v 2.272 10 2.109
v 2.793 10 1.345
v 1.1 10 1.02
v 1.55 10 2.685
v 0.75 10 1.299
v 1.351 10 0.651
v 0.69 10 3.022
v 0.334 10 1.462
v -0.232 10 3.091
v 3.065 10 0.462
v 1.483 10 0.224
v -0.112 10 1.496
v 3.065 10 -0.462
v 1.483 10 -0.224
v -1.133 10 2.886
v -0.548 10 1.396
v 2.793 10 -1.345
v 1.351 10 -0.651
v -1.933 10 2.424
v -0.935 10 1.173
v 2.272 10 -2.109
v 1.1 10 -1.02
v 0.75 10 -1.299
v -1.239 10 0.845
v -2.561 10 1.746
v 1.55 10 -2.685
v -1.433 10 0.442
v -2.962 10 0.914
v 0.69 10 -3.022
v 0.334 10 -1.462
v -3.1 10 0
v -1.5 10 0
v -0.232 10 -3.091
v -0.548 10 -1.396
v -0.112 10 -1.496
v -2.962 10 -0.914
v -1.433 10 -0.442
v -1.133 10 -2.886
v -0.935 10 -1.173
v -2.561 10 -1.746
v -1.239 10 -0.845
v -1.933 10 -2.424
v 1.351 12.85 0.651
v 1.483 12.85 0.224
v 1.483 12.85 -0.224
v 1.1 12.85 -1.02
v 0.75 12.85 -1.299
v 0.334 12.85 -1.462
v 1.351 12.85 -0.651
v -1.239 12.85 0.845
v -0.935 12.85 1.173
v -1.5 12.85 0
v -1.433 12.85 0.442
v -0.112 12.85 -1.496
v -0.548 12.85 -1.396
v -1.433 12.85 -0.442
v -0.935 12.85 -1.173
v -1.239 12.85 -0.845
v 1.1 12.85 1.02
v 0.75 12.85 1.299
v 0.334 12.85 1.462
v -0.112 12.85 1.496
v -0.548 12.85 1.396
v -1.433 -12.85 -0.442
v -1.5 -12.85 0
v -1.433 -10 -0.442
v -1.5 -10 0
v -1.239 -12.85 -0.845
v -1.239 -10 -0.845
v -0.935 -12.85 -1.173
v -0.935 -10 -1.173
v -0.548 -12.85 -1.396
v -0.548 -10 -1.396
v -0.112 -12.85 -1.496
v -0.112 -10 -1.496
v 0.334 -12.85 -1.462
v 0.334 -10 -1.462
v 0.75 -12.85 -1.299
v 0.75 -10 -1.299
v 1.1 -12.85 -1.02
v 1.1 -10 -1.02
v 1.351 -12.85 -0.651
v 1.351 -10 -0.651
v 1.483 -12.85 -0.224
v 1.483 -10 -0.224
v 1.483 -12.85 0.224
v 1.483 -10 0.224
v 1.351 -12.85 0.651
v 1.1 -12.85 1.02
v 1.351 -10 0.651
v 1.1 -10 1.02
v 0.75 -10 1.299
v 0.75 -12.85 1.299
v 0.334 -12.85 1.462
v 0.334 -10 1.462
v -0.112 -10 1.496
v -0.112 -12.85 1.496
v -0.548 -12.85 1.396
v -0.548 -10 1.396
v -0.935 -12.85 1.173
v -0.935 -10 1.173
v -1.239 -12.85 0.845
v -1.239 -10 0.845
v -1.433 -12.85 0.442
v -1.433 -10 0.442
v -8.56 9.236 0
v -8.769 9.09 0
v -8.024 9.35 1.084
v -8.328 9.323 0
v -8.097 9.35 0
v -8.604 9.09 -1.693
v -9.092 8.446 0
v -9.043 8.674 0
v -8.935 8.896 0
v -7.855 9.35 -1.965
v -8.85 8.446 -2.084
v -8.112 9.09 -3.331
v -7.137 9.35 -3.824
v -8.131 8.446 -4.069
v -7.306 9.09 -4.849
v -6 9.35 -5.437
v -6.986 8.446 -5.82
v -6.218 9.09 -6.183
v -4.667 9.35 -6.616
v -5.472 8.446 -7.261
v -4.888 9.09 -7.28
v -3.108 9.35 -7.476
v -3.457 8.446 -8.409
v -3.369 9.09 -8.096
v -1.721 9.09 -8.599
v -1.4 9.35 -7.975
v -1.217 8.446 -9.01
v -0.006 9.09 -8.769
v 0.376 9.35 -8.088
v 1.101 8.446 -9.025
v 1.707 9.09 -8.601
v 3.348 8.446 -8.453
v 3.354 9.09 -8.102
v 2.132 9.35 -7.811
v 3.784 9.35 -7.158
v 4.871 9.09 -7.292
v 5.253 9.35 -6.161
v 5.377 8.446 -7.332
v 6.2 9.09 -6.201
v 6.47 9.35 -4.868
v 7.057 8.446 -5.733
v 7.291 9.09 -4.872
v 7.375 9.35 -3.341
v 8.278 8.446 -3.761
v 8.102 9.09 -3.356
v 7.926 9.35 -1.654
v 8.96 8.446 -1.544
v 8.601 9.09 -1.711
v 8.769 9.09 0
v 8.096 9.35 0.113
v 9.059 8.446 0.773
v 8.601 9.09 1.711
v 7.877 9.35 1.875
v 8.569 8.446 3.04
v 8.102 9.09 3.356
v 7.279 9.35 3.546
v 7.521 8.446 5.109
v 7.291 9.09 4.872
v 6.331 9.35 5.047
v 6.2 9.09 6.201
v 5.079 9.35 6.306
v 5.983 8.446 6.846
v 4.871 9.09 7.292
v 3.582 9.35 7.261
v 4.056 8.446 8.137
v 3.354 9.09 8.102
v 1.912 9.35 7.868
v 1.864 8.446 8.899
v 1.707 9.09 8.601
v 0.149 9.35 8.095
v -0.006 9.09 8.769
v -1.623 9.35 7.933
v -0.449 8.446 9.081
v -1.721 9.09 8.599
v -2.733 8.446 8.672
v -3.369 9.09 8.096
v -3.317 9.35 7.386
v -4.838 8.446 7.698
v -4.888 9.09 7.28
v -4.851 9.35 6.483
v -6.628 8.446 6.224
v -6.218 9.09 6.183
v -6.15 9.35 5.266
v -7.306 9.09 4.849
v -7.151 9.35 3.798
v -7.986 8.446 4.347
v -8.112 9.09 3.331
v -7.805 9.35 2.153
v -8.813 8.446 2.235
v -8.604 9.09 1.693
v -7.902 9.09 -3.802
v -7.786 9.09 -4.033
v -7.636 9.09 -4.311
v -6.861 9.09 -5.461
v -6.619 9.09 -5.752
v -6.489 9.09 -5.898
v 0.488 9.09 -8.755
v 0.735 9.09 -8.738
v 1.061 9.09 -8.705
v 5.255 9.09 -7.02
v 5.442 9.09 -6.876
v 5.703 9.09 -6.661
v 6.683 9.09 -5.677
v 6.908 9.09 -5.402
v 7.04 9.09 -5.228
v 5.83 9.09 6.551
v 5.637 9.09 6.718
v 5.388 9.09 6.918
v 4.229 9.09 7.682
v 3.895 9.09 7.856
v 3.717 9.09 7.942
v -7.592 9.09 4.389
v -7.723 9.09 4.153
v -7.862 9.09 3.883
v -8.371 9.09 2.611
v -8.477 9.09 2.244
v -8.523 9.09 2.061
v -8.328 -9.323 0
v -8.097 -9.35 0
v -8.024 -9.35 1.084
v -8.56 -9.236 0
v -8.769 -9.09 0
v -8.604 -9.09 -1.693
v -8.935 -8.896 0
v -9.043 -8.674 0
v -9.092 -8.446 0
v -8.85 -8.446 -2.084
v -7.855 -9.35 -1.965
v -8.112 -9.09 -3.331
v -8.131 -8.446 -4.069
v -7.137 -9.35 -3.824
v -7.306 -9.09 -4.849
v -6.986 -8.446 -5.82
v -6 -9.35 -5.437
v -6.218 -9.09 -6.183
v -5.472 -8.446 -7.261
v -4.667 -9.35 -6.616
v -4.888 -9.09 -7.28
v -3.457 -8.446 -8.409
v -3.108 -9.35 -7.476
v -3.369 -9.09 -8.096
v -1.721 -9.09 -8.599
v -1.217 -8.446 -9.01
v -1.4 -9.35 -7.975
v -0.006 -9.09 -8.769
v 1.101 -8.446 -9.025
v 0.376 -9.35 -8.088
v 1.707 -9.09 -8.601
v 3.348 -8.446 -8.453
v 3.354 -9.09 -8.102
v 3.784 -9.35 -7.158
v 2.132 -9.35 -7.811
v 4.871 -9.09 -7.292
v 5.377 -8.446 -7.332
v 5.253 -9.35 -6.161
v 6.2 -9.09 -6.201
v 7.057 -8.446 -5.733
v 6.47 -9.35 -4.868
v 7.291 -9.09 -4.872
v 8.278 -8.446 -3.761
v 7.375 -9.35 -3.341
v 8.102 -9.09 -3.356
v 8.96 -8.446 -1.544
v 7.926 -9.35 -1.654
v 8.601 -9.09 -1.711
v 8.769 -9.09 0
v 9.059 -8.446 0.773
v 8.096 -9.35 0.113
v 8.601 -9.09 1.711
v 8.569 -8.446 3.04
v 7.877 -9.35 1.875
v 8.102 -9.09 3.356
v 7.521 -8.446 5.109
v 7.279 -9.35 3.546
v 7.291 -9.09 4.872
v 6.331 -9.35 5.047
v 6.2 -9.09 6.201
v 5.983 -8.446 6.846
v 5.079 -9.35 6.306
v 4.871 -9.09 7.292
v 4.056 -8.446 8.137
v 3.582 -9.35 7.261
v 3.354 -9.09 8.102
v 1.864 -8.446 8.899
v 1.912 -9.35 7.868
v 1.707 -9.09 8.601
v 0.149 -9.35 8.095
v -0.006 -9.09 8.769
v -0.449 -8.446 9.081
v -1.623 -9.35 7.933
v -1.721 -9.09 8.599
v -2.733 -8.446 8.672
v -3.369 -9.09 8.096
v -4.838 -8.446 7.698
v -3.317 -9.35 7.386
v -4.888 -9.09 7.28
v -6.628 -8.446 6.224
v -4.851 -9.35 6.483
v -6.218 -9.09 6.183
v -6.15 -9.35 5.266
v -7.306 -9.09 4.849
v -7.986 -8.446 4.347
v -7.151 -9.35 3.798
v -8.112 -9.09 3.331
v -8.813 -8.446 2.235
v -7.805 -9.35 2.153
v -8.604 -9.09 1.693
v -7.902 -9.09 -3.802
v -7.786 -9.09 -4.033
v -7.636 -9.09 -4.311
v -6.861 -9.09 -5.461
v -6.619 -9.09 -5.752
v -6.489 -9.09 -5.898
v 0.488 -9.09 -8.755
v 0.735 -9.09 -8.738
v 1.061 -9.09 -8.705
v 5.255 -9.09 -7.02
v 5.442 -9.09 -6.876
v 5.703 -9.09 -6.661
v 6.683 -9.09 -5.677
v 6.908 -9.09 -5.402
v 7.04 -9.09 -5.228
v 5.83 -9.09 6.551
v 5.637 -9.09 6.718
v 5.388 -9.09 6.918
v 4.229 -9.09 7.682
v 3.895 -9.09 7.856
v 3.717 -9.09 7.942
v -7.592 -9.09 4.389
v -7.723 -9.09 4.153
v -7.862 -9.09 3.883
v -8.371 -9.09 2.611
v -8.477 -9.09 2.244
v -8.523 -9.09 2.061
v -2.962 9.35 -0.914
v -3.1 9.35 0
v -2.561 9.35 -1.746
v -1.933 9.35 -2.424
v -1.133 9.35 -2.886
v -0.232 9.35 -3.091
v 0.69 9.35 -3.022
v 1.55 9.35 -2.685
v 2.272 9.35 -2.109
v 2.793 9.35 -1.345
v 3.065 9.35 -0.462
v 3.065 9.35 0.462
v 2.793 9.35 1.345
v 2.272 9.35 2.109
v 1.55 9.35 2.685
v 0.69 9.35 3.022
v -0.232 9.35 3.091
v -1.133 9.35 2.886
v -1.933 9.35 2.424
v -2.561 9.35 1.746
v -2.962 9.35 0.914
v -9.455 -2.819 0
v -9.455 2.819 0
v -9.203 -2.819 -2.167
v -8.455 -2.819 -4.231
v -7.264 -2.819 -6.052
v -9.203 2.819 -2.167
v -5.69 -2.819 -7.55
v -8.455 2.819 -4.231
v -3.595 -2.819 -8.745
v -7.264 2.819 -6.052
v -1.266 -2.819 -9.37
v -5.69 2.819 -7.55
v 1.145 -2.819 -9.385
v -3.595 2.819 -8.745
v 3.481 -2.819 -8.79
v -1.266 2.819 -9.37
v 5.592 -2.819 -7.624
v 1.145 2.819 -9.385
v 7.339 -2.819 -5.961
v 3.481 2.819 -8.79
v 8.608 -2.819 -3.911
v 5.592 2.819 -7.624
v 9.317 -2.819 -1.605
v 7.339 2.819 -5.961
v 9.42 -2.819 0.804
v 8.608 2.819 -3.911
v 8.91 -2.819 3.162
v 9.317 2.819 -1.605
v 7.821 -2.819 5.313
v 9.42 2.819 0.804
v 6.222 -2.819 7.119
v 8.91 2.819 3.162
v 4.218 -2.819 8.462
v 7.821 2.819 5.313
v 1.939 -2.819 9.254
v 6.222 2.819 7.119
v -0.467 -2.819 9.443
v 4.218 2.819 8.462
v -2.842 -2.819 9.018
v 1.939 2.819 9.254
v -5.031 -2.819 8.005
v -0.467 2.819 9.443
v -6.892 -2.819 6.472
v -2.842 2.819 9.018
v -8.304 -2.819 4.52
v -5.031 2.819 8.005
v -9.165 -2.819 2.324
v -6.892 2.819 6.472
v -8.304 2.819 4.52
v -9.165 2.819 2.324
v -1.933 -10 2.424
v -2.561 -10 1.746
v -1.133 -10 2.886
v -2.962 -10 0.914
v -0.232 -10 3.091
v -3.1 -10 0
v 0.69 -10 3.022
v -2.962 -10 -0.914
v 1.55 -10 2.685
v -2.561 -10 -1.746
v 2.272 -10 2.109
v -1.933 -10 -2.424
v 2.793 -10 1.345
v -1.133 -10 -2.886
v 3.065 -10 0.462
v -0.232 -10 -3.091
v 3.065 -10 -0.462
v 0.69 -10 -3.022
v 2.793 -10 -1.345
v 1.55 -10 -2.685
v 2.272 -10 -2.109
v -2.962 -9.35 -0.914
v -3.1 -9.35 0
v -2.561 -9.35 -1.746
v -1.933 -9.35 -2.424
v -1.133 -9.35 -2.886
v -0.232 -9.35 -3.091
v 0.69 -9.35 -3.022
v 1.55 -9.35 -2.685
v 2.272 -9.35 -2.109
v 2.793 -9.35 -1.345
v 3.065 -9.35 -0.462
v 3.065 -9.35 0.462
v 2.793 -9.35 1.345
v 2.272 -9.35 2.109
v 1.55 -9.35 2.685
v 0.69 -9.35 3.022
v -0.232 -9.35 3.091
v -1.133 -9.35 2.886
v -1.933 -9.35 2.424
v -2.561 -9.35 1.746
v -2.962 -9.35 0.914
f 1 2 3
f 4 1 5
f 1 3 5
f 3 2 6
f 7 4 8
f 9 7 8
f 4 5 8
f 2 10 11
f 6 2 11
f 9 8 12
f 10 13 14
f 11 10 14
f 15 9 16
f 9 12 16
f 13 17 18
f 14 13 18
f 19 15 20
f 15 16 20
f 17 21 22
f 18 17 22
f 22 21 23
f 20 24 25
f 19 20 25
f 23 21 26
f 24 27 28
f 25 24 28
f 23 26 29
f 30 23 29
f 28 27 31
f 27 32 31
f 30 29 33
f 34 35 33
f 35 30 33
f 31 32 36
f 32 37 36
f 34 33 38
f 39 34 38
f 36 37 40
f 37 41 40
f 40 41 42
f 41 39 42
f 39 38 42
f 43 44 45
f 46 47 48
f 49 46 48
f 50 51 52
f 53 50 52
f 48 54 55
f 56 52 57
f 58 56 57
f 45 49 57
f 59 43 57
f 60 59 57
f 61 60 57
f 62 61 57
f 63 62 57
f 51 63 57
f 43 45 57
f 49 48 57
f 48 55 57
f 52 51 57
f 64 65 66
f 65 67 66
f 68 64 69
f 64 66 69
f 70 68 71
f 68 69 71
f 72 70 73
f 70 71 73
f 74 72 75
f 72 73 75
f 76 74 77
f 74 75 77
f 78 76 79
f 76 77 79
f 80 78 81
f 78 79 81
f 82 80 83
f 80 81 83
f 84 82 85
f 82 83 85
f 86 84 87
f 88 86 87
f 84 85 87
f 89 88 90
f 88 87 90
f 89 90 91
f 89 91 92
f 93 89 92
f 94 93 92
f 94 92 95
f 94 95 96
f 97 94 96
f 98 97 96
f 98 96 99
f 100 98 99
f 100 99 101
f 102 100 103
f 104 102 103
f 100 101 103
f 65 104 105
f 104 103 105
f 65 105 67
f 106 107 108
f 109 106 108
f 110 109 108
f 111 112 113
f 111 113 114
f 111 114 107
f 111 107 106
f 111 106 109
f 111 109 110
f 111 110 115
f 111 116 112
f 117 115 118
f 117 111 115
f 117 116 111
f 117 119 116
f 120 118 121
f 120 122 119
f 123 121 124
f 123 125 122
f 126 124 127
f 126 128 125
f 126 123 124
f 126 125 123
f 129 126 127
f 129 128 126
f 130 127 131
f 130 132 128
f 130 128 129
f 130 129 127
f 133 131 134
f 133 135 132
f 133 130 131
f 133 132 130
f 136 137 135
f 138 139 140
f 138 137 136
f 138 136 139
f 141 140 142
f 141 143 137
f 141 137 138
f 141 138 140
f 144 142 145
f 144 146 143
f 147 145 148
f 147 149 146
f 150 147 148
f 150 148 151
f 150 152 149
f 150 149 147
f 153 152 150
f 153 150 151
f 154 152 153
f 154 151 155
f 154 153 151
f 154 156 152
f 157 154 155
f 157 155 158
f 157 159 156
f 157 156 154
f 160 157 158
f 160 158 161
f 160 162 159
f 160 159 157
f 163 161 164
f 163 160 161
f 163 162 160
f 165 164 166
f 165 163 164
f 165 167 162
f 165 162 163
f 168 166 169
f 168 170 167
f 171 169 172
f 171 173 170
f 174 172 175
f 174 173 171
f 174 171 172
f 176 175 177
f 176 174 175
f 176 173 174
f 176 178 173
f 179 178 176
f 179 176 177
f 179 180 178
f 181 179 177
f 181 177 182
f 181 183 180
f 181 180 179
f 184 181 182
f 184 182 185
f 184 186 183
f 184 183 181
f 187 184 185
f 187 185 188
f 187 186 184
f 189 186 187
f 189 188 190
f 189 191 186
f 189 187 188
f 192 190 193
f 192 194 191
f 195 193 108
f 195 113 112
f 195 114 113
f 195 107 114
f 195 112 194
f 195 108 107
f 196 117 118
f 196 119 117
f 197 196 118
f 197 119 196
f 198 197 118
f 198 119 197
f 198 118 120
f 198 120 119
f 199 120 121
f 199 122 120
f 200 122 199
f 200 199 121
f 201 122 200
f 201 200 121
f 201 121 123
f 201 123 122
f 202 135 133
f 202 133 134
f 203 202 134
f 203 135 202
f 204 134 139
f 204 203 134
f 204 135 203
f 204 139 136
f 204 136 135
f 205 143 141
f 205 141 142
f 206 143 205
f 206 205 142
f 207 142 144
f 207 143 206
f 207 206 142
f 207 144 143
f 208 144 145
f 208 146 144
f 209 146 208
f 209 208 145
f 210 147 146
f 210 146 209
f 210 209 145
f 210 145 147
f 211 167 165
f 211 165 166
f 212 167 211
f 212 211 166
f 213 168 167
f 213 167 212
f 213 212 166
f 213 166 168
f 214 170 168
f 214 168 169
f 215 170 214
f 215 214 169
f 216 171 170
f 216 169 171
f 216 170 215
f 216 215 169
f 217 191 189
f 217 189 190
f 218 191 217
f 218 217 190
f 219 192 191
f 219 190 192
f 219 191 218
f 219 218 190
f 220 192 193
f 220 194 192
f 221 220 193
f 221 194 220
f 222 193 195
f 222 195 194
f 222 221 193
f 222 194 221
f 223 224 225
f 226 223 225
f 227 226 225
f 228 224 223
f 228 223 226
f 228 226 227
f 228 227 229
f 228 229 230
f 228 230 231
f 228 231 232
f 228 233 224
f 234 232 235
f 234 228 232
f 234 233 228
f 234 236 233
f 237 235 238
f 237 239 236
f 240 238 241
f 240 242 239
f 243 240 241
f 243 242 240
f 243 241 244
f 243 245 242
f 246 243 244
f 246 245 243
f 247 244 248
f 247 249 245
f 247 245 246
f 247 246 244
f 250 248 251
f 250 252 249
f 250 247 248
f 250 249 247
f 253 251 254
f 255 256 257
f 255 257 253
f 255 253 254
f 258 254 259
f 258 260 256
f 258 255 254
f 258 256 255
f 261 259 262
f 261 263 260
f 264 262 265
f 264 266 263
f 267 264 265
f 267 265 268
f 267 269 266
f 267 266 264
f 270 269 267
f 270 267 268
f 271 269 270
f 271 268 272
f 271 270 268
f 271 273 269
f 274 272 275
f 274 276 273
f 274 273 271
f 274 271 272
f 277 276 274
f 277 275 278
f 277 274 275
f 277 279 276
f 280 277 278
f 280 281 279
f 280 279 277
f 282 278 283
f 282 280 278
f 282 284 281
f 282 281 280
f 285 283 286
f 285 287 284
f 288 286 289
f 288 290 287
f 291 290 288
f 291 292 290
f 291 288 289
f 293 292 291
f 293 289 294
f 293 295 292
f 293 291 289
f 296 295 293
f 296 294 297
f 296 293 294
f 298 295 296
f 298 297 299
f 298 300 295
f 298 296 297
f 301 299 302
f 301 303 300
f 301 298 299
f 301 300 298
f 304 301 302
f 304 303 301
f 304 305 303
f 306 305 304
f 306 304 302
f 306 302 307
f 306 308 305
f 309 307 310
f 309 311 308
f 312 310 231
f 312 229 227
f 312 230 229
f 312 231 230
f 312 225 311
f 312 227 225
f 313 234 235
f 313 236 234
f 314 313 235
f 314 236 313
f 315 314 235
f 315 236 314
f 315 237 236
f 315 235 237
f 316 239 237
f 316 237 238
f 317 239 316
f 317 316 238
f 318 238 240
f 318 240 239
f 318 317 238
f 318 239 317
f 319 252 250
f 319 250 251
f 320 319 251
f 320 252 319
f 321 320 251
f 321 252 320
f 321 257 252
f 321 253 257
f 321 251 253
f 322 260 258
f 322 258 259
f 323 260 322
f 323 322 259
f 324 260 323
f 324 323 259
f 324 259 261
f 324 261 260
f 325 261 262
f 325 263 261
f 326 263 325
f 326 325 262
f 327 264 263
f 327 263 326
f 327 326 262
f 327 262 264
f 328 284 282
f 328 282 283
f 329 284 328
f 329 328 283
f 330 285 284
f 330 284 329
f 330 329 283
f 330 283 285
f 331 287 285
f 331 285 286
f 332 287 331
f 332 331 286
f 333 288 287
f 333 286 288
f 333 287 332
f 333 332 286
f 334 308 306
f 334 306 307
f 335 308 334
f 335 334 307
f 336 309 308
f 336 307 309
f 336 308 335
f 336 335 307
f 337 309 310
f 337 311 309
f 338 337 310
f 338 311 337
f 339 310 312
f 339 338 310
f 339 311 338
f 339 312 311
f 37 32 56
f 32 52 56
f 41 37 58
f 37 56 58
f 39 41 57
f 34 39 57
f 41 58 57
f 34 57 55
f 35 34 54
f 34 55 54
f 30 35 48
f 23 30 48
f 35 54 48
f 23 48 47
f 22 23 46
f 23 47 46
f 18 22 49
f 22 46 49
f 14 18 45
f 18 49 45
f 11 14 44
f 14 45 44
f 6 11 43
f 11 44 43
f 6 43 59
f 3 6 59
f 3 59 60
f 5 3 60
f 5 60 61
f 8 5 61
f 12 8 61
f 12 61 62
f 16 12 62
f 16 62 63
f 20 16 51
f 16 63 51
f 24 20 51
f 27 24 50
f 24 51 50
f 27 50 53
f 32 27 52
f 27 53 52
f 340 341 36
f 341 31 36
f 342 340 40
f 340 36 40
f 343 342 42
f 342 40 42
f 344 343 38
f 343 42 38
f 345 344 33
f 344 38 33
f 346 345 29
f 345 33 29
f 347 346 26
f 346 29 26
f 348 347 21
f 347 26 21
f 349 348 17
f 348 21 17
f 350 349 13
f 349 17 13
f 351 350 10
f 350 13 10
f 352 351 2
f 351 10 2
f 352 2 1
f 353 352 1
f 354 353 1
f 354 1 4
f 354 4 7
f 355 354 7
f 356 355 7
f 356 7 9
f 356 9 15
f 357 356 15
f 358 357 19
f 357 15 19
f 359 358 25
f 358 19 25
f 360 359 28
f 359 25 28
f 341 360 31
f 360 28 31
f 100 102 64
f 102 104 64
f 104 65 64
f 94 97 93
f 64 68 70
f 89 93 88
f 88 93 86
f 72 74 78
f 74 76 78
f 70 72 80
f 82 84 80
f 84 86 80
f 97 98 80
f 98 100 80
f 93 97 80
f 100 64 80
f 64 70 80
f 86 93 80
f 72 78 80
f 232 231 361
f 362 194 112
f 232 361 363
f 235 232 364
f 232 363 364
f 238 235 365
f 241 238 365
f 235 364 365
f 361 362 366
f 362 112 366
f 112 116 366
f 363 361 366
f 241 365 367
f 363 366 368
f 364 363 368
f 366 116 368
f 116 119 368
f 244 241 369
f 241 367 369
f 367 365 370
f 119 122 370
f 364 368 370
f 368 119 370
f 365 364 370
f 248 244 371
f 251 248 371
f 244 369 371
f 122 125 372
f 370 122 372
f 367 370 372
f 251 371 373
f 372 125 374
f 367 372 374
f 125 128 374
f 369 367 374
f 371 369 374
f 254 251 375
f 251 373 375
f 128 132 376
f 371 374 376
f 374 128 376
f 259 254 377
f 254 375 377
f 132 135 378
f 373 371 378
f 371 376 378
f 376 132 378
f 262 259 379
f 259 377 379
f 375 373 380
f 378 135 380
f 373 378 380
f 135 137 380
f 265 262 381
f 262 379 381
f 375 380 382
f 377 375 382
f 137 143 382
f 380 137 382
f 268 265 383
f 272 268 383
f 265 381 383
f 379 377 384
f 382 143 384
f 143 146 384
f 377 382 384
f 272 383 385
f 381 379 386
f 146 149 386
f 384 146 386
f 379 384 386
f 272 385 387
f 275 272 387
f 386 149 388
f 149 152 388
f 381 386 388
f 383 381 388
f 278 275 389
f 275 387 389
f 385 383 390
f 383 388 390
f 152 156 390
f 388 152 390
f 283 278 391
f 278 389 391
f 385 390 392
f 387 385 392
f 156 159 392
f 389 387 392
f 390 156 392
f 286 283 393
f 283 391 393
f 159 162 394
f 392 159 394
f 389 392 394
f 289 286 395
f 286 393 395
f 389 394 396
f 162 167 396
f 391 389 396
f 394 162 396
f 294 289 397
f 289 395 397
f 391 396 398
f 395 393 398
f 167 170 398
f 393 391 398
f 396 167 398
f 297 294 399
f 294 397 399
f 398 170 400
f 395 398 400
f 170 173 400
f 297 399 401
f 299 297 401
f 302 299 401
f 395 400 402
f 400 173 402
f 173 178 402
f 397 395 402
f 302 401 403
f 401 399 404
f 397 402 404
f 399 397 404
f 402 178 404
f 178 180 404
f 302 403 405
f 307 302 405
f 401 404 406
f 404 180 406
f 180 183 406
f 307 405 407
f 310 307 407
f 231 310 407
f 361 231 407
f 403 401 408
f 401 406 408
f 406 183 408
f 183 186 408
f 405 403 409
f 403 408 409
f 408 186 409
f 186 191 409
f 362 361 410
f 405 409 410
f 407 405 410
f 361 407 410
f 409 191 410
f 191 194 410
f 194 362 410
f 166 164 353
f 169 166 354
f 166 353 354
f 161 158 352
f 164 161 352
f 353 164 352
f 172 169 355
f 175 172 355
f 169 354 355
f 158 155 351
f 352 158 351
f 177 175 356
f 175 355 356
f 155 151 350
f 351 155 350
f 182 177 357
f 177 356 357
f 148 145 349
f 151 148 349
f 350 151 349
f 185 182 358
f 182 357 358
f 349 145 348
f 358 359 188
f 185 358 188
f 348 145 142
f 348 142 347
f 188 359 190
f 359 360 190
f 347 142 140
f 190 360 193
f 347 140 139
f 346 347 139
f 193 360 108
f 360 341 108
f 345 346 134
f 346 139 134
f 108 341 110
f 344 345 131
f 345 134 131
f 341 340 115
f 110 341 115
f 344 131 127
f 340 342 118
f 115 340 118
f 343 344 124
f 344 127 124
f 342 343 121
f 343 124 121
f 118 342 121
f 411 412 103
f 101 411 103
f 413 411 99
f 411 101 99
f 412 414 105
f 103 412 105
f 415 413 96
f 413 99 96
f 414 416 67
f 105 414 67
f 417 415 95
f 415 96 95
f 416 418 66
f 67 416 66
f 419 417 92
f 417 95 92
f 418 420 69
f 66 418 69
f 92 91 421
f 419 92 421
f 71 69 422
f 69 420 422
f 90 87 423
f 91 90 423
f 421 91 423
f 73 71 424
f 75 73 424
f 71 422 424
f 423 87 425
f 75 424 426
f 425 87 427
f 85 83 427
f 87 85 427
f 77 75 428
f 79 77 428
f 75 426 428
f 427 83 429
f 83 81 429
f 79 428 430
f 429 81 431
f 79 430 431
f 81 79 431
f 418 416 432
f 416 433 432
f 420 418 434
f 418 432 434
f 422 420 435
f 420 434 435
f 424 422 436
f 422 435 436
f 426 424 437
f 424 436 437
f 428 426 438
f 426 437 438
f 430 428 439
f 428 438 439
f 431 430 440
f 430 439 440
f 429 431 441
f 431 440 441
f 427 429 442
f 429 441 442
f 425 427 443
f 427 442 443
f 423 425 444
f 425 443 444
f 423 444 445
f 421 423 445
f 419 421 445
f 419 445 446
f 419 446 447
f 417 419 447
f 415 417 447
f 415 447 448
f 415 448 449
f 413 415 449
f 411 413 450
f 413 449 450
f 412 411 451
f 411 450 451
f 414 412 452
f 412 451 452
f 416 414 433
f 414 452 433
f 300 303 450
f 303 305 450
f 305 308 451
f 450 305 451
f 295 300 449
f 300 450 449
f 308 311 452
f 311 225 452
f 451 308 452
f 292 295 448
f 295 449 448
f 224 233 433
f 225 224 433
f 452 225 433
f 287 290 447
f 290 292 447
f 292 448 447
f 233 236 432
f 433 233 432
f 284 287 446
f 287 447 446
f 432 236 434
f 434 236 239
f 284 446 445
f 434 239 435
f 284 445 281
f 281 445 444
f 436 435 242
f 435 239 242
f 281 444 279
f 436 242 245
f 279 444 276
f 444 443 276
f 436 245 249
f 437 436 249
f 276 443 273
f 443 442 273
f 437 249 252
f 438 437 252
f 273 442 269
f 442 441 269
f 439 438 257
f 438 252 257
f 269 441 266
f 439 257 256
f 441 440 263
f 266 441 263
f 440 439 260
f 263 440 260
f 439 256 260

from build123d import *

# Parameters (mm, degrees)
FILLET_1_R = 1


with BuildPart() as part:
    # 草图1 → 旋转1 (revolve)
    with BuildSketch(Plane.XY, mode=Mode.PRIVATE) as revolve_1_sk:
        with BuildLine():
            Line((0, 12.85), (0, -12.85))
            Line((0, -12.85), (1.5, -12.85))
            Line((1.5, -12.85), (1.5, -10))
            Line((1.5, -10), (3.1, -10))
            Line((3.1, -10), (3.1, -9.35))
            Line((3.1, -9.35), (9, -9.35))
            ThreePointArc((9, -9.35), (9.5, 0), (9, 9.35))
            Line((9, 9.35), (3.1, 9.35))
            Line((3.1, 9.35), (3.1, 10))
            Line((3.1, 10), (1.5, 10))
            Line((1.5, 10), (1.5, 12.85))
            Line((1.5, 12.85), (0, 12.85))
        make_face()
    revolve(revolve_1_sk.sketch.rotate(Axis((0, 12.85, 0), (0, -1, 0)), 180), axis=Axis((0, 12.85, 0), (0, -1, 0)))

    # 圆角1
    fillet_1_edges = [part.edges().sort_by_distance(p)[0] for p in [
        (9, -9.35, 0),
        (9, 9.35, 0),
    ]]
    fillet(fillet_1_edges, radius=FILLET_1_R)


solid = part.part
